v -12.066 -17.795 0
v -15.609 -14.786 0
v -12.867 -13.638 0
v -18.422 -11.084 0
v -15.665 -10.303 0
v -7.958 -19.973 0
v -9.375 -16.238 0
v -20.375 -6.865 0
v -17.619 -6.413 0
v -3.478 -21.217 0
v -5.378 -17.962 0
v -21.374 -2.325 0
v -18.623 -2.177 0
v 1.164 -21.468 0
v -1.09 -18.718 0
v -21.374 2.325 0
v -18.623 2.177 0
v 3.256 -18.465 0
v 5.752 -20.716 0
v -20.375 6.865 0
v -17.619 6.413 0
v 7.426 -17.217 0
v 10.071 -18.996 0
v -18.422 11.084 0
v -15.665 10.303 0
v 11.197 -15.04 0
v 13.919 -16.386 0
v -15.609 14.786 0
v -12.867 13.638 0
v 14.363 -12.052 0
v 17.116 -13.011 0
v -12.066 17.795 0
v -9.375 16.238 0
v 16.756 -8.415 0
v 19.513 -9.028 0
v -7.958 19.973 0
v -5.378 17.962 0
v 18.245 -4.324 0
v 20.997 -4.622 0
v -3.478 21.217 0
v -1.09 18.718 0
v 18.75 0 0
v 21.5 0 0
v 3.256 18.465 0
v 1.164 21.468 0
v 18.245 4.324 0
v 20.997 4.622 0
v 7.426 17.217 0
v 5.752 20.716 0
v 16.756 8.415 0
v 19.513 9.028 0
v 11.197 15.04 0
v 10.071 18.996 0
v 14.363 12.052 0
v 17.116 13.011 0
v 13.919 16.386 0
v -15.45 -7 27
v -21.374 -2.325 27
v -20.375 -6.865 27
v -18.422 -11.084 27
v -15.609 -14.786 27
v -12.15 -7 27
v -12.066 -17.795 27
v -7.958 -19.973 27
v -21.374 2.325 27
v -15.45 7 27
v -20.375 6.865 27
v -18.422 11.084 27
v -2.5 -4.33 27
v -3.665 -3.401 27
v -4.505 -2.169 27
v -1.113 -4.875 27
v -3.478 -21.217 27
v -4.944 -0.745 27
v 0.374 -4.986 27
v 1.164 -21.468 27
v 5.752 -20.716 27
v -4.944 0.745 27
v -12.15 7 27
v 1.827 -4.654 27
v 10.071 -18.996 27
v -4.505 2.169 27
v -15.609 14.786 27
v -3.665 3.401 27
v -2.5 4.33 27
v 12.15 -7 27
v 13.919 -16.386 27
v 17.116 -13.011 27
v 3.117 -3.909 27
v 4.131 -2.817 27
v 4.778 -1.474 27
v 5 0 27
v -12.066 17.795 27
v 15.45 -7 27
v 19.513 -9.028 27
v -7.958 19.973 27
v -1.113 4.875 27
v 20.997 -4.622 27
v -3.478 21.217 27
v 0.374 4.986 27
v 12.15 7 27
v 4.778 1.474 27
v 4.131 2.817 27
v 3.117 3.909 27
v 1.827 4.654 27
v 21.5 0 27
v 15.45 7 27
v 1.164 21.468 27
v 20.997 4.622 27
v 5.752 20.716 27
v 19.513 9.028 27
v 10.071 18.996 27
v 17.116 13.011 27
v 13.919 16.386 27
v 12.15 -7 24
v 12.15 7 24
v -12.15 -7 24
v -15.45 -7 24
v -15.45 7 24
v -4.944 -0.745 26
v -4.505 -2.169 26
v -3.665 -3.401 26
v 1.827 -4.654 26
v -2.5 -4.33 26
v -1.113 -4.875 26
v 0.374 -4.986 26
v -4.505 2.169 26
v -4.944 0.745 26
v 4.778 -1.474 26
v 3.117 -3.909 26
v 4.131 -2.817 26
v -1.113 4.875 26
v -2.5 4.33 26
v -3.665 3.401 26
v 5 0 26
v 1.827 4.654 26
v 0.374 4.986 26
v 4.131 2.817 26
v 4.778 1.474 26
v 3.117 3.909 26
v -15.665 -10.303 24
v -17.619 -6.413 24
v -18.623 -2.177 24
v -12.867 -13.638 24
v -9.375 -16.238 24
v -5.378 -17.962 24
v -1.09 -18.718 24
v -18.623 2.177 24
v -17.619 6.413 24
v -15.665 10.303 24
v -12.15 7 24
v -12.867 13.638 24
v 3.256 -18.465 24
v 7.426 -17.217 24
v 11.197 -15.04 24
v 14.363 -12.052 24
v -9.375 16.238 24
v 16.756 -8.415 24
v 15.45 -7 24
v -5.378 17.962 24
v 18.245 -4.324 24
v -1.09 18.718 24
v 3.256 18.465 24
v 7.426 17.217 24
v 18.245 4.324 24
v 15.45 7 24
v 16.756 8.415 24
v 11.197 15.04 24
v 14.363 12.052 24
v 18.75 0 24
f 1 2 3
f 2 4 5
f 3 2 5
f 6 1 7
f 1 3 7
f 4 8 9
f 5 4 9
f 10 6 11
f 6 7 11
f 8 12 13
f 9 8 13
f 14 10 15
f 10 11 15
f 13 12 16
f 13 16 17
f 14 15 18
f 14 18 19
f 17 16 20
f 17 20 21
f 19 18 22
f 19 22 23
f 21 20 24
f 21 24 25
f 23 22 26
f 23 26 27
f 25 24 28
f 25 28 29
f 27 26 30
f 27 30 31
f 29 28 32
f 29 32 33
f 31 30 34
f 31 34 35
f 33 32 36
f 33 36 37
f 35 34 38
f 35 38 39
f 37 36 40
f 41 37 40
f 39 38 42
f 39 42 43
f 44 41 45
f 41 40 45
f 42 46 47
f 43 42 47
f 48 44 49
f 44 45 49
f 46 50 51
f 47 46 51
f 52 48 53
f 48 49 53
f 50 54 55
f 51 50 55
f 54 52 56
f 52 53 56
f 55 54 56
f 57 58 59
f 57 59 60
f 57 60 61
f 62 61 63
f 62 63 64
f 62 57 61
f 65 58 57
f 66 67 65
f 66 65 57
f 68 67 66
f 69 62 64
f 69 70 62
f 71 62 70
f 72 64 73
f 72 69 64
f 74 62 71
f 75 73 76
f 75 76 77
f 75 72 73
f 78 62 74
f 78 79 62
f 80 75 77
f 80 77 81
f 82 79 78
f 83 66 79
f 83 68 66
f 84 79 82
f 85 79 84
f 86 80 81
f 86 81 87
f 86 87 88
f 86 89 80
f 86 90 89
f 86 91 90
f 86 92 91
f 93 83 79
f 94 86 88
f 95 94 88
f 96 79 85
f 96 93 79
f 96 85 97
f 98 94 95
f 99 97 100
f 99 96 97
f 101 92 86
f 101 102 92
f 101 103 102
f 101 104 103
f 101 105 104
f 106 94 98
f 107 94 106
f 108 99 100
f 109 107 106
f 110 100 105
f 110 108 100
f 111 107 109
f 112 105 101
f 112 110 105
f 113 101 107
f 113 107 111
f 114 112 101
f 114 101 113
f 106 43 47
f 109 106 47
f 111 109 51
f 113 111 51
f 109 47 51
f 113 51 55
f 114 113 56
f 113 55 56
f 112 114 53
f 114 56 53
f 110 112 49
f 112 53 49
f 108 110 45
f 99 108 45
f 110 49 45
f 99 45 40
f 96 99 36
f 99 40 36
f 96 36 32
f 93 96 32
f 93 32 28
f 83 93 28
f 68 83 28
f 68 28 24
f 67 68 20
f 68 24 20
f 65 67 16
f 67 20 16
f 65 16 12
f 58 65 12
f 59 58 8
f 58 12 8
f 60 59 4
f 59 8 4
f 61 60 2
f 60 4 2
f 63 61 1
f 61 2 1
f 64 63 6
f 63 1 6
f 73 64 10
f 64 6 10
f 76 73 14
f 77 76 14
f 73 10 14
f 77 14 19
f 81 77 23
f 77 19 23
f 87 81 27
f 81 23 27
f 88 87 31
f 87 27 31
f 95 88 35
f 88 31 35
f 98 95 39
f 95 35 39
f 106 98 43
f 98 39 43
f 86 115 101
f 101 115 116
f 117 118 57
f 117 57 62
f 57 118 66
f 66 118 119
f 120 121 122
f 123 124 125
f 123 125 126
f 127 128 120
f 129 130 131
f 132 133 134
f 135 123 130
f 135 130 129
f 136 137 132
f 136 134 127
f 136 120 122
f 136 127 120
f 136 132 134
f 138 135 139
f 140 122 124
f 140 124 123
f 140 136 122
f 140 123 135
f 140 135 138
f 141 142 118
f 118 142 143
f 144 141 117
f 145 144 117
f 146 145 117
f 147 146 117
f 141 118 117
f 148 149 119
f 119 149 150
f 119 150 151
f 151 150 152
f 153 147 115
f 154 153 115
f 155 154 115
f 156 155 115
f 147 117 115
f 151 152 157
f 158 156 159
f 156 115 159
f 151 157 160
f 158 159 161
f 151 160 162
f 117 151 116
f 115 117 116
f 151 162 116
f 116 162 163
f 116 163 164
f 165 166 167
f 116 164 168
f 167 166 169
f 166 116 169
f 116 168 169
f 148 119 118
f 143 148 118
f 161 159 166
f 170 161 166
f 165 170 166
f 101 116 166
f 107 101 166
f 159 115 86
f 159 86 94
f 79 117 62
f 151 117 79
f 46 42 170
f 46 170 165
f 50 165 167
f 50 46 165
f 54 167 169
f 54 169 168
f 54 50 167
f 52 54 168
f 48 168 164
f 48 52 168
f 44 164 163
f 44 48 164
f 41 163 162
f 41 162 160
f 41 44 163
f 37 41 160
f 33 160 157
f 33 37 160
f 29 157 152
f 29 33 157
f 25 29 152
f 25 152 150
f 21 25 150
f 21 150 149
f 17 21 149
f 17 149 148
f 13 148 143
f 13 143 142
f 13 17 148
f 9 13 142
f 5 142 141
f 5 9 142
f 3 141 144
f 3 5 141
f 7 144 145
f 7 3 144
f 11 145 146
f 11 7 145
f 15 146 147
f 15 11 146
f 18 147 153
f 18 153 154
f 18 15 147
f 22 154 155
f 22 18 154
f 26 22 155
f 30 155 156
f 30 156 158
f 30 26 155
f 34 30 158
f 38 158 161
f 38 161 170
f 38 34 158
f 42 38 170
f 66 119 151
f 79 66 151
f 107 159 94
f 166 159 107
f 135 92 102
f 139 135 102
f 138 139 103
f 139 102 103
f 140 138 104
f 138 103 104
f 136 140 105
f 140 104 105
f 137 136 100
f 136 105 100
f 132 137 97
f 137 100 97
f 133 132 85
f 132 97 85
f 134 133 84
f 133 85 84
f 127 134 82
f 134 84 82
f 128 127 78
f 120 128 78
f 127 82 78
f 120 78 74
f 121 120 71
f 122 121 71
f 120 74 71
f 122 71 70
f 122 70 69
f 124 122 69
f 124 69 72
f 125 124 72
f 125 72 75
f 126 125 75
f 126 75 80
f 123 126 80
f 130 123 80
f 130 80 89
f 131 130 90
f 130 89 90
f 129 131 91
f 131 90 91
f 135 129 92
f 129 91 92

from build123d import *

# Parameters (mm, degrees)
SKETCH1_R           = 21.5
BOSS_EXTRUDE1_DEPTH = 27
SKETCH2_R           = 18.75
CUT_EXTRUDE2_DEPTH  = 24
SKETCH4_W           = 3.3
SKETCH4_H           = 14
CUT_EXTRUDE6_DEPTH  = 32
SKETCH7_R           = 5
CUT_EXTRUDE8_DEPTH  = 1


with BuildPart() as part:
    # Sketch1 → Boss-Extrude1 (new body)
    with BuildSketch(Plane.XY):
        Circle(SKETCH1_R)
    extrude(amount=BOSS_EXTRUDE1_DEPTH)

    # Sketch2 → Cut-Extrude2 (cut)
    with BuildSketch(Plane.XY):
        Circle(SKETCH2_R)
    extrude(amount=CUT_EXTRUDE2_DEPTH, mode=Mode.SUBTRACT)

    # Sketch4 → Cut-Extrude6 (cut)
    with BuildSketch(Plane.XY):
        with Locations((13.8, 0)):
            Rectangle(SKETCH4_W, SKETCH4_H)
        with Locations((-13.8, 0)):
            Rectangle(SKETCH4_W, SKETCH4_H)
    extrude(amount=CUT_EXTRUDE6_DEPTH, mode=Mode.SUBTRACT)

    # Sketch7 → Cut-Extrude8 (cut)
    with BuildSketch(Plane.XY.offset(27)):
        Circle(SKETCH7_R)
    extrude(amount=-CUT_EXTRUDE8_DEPTH, mode=Mode.SUBTRACT)


solid = part.part
